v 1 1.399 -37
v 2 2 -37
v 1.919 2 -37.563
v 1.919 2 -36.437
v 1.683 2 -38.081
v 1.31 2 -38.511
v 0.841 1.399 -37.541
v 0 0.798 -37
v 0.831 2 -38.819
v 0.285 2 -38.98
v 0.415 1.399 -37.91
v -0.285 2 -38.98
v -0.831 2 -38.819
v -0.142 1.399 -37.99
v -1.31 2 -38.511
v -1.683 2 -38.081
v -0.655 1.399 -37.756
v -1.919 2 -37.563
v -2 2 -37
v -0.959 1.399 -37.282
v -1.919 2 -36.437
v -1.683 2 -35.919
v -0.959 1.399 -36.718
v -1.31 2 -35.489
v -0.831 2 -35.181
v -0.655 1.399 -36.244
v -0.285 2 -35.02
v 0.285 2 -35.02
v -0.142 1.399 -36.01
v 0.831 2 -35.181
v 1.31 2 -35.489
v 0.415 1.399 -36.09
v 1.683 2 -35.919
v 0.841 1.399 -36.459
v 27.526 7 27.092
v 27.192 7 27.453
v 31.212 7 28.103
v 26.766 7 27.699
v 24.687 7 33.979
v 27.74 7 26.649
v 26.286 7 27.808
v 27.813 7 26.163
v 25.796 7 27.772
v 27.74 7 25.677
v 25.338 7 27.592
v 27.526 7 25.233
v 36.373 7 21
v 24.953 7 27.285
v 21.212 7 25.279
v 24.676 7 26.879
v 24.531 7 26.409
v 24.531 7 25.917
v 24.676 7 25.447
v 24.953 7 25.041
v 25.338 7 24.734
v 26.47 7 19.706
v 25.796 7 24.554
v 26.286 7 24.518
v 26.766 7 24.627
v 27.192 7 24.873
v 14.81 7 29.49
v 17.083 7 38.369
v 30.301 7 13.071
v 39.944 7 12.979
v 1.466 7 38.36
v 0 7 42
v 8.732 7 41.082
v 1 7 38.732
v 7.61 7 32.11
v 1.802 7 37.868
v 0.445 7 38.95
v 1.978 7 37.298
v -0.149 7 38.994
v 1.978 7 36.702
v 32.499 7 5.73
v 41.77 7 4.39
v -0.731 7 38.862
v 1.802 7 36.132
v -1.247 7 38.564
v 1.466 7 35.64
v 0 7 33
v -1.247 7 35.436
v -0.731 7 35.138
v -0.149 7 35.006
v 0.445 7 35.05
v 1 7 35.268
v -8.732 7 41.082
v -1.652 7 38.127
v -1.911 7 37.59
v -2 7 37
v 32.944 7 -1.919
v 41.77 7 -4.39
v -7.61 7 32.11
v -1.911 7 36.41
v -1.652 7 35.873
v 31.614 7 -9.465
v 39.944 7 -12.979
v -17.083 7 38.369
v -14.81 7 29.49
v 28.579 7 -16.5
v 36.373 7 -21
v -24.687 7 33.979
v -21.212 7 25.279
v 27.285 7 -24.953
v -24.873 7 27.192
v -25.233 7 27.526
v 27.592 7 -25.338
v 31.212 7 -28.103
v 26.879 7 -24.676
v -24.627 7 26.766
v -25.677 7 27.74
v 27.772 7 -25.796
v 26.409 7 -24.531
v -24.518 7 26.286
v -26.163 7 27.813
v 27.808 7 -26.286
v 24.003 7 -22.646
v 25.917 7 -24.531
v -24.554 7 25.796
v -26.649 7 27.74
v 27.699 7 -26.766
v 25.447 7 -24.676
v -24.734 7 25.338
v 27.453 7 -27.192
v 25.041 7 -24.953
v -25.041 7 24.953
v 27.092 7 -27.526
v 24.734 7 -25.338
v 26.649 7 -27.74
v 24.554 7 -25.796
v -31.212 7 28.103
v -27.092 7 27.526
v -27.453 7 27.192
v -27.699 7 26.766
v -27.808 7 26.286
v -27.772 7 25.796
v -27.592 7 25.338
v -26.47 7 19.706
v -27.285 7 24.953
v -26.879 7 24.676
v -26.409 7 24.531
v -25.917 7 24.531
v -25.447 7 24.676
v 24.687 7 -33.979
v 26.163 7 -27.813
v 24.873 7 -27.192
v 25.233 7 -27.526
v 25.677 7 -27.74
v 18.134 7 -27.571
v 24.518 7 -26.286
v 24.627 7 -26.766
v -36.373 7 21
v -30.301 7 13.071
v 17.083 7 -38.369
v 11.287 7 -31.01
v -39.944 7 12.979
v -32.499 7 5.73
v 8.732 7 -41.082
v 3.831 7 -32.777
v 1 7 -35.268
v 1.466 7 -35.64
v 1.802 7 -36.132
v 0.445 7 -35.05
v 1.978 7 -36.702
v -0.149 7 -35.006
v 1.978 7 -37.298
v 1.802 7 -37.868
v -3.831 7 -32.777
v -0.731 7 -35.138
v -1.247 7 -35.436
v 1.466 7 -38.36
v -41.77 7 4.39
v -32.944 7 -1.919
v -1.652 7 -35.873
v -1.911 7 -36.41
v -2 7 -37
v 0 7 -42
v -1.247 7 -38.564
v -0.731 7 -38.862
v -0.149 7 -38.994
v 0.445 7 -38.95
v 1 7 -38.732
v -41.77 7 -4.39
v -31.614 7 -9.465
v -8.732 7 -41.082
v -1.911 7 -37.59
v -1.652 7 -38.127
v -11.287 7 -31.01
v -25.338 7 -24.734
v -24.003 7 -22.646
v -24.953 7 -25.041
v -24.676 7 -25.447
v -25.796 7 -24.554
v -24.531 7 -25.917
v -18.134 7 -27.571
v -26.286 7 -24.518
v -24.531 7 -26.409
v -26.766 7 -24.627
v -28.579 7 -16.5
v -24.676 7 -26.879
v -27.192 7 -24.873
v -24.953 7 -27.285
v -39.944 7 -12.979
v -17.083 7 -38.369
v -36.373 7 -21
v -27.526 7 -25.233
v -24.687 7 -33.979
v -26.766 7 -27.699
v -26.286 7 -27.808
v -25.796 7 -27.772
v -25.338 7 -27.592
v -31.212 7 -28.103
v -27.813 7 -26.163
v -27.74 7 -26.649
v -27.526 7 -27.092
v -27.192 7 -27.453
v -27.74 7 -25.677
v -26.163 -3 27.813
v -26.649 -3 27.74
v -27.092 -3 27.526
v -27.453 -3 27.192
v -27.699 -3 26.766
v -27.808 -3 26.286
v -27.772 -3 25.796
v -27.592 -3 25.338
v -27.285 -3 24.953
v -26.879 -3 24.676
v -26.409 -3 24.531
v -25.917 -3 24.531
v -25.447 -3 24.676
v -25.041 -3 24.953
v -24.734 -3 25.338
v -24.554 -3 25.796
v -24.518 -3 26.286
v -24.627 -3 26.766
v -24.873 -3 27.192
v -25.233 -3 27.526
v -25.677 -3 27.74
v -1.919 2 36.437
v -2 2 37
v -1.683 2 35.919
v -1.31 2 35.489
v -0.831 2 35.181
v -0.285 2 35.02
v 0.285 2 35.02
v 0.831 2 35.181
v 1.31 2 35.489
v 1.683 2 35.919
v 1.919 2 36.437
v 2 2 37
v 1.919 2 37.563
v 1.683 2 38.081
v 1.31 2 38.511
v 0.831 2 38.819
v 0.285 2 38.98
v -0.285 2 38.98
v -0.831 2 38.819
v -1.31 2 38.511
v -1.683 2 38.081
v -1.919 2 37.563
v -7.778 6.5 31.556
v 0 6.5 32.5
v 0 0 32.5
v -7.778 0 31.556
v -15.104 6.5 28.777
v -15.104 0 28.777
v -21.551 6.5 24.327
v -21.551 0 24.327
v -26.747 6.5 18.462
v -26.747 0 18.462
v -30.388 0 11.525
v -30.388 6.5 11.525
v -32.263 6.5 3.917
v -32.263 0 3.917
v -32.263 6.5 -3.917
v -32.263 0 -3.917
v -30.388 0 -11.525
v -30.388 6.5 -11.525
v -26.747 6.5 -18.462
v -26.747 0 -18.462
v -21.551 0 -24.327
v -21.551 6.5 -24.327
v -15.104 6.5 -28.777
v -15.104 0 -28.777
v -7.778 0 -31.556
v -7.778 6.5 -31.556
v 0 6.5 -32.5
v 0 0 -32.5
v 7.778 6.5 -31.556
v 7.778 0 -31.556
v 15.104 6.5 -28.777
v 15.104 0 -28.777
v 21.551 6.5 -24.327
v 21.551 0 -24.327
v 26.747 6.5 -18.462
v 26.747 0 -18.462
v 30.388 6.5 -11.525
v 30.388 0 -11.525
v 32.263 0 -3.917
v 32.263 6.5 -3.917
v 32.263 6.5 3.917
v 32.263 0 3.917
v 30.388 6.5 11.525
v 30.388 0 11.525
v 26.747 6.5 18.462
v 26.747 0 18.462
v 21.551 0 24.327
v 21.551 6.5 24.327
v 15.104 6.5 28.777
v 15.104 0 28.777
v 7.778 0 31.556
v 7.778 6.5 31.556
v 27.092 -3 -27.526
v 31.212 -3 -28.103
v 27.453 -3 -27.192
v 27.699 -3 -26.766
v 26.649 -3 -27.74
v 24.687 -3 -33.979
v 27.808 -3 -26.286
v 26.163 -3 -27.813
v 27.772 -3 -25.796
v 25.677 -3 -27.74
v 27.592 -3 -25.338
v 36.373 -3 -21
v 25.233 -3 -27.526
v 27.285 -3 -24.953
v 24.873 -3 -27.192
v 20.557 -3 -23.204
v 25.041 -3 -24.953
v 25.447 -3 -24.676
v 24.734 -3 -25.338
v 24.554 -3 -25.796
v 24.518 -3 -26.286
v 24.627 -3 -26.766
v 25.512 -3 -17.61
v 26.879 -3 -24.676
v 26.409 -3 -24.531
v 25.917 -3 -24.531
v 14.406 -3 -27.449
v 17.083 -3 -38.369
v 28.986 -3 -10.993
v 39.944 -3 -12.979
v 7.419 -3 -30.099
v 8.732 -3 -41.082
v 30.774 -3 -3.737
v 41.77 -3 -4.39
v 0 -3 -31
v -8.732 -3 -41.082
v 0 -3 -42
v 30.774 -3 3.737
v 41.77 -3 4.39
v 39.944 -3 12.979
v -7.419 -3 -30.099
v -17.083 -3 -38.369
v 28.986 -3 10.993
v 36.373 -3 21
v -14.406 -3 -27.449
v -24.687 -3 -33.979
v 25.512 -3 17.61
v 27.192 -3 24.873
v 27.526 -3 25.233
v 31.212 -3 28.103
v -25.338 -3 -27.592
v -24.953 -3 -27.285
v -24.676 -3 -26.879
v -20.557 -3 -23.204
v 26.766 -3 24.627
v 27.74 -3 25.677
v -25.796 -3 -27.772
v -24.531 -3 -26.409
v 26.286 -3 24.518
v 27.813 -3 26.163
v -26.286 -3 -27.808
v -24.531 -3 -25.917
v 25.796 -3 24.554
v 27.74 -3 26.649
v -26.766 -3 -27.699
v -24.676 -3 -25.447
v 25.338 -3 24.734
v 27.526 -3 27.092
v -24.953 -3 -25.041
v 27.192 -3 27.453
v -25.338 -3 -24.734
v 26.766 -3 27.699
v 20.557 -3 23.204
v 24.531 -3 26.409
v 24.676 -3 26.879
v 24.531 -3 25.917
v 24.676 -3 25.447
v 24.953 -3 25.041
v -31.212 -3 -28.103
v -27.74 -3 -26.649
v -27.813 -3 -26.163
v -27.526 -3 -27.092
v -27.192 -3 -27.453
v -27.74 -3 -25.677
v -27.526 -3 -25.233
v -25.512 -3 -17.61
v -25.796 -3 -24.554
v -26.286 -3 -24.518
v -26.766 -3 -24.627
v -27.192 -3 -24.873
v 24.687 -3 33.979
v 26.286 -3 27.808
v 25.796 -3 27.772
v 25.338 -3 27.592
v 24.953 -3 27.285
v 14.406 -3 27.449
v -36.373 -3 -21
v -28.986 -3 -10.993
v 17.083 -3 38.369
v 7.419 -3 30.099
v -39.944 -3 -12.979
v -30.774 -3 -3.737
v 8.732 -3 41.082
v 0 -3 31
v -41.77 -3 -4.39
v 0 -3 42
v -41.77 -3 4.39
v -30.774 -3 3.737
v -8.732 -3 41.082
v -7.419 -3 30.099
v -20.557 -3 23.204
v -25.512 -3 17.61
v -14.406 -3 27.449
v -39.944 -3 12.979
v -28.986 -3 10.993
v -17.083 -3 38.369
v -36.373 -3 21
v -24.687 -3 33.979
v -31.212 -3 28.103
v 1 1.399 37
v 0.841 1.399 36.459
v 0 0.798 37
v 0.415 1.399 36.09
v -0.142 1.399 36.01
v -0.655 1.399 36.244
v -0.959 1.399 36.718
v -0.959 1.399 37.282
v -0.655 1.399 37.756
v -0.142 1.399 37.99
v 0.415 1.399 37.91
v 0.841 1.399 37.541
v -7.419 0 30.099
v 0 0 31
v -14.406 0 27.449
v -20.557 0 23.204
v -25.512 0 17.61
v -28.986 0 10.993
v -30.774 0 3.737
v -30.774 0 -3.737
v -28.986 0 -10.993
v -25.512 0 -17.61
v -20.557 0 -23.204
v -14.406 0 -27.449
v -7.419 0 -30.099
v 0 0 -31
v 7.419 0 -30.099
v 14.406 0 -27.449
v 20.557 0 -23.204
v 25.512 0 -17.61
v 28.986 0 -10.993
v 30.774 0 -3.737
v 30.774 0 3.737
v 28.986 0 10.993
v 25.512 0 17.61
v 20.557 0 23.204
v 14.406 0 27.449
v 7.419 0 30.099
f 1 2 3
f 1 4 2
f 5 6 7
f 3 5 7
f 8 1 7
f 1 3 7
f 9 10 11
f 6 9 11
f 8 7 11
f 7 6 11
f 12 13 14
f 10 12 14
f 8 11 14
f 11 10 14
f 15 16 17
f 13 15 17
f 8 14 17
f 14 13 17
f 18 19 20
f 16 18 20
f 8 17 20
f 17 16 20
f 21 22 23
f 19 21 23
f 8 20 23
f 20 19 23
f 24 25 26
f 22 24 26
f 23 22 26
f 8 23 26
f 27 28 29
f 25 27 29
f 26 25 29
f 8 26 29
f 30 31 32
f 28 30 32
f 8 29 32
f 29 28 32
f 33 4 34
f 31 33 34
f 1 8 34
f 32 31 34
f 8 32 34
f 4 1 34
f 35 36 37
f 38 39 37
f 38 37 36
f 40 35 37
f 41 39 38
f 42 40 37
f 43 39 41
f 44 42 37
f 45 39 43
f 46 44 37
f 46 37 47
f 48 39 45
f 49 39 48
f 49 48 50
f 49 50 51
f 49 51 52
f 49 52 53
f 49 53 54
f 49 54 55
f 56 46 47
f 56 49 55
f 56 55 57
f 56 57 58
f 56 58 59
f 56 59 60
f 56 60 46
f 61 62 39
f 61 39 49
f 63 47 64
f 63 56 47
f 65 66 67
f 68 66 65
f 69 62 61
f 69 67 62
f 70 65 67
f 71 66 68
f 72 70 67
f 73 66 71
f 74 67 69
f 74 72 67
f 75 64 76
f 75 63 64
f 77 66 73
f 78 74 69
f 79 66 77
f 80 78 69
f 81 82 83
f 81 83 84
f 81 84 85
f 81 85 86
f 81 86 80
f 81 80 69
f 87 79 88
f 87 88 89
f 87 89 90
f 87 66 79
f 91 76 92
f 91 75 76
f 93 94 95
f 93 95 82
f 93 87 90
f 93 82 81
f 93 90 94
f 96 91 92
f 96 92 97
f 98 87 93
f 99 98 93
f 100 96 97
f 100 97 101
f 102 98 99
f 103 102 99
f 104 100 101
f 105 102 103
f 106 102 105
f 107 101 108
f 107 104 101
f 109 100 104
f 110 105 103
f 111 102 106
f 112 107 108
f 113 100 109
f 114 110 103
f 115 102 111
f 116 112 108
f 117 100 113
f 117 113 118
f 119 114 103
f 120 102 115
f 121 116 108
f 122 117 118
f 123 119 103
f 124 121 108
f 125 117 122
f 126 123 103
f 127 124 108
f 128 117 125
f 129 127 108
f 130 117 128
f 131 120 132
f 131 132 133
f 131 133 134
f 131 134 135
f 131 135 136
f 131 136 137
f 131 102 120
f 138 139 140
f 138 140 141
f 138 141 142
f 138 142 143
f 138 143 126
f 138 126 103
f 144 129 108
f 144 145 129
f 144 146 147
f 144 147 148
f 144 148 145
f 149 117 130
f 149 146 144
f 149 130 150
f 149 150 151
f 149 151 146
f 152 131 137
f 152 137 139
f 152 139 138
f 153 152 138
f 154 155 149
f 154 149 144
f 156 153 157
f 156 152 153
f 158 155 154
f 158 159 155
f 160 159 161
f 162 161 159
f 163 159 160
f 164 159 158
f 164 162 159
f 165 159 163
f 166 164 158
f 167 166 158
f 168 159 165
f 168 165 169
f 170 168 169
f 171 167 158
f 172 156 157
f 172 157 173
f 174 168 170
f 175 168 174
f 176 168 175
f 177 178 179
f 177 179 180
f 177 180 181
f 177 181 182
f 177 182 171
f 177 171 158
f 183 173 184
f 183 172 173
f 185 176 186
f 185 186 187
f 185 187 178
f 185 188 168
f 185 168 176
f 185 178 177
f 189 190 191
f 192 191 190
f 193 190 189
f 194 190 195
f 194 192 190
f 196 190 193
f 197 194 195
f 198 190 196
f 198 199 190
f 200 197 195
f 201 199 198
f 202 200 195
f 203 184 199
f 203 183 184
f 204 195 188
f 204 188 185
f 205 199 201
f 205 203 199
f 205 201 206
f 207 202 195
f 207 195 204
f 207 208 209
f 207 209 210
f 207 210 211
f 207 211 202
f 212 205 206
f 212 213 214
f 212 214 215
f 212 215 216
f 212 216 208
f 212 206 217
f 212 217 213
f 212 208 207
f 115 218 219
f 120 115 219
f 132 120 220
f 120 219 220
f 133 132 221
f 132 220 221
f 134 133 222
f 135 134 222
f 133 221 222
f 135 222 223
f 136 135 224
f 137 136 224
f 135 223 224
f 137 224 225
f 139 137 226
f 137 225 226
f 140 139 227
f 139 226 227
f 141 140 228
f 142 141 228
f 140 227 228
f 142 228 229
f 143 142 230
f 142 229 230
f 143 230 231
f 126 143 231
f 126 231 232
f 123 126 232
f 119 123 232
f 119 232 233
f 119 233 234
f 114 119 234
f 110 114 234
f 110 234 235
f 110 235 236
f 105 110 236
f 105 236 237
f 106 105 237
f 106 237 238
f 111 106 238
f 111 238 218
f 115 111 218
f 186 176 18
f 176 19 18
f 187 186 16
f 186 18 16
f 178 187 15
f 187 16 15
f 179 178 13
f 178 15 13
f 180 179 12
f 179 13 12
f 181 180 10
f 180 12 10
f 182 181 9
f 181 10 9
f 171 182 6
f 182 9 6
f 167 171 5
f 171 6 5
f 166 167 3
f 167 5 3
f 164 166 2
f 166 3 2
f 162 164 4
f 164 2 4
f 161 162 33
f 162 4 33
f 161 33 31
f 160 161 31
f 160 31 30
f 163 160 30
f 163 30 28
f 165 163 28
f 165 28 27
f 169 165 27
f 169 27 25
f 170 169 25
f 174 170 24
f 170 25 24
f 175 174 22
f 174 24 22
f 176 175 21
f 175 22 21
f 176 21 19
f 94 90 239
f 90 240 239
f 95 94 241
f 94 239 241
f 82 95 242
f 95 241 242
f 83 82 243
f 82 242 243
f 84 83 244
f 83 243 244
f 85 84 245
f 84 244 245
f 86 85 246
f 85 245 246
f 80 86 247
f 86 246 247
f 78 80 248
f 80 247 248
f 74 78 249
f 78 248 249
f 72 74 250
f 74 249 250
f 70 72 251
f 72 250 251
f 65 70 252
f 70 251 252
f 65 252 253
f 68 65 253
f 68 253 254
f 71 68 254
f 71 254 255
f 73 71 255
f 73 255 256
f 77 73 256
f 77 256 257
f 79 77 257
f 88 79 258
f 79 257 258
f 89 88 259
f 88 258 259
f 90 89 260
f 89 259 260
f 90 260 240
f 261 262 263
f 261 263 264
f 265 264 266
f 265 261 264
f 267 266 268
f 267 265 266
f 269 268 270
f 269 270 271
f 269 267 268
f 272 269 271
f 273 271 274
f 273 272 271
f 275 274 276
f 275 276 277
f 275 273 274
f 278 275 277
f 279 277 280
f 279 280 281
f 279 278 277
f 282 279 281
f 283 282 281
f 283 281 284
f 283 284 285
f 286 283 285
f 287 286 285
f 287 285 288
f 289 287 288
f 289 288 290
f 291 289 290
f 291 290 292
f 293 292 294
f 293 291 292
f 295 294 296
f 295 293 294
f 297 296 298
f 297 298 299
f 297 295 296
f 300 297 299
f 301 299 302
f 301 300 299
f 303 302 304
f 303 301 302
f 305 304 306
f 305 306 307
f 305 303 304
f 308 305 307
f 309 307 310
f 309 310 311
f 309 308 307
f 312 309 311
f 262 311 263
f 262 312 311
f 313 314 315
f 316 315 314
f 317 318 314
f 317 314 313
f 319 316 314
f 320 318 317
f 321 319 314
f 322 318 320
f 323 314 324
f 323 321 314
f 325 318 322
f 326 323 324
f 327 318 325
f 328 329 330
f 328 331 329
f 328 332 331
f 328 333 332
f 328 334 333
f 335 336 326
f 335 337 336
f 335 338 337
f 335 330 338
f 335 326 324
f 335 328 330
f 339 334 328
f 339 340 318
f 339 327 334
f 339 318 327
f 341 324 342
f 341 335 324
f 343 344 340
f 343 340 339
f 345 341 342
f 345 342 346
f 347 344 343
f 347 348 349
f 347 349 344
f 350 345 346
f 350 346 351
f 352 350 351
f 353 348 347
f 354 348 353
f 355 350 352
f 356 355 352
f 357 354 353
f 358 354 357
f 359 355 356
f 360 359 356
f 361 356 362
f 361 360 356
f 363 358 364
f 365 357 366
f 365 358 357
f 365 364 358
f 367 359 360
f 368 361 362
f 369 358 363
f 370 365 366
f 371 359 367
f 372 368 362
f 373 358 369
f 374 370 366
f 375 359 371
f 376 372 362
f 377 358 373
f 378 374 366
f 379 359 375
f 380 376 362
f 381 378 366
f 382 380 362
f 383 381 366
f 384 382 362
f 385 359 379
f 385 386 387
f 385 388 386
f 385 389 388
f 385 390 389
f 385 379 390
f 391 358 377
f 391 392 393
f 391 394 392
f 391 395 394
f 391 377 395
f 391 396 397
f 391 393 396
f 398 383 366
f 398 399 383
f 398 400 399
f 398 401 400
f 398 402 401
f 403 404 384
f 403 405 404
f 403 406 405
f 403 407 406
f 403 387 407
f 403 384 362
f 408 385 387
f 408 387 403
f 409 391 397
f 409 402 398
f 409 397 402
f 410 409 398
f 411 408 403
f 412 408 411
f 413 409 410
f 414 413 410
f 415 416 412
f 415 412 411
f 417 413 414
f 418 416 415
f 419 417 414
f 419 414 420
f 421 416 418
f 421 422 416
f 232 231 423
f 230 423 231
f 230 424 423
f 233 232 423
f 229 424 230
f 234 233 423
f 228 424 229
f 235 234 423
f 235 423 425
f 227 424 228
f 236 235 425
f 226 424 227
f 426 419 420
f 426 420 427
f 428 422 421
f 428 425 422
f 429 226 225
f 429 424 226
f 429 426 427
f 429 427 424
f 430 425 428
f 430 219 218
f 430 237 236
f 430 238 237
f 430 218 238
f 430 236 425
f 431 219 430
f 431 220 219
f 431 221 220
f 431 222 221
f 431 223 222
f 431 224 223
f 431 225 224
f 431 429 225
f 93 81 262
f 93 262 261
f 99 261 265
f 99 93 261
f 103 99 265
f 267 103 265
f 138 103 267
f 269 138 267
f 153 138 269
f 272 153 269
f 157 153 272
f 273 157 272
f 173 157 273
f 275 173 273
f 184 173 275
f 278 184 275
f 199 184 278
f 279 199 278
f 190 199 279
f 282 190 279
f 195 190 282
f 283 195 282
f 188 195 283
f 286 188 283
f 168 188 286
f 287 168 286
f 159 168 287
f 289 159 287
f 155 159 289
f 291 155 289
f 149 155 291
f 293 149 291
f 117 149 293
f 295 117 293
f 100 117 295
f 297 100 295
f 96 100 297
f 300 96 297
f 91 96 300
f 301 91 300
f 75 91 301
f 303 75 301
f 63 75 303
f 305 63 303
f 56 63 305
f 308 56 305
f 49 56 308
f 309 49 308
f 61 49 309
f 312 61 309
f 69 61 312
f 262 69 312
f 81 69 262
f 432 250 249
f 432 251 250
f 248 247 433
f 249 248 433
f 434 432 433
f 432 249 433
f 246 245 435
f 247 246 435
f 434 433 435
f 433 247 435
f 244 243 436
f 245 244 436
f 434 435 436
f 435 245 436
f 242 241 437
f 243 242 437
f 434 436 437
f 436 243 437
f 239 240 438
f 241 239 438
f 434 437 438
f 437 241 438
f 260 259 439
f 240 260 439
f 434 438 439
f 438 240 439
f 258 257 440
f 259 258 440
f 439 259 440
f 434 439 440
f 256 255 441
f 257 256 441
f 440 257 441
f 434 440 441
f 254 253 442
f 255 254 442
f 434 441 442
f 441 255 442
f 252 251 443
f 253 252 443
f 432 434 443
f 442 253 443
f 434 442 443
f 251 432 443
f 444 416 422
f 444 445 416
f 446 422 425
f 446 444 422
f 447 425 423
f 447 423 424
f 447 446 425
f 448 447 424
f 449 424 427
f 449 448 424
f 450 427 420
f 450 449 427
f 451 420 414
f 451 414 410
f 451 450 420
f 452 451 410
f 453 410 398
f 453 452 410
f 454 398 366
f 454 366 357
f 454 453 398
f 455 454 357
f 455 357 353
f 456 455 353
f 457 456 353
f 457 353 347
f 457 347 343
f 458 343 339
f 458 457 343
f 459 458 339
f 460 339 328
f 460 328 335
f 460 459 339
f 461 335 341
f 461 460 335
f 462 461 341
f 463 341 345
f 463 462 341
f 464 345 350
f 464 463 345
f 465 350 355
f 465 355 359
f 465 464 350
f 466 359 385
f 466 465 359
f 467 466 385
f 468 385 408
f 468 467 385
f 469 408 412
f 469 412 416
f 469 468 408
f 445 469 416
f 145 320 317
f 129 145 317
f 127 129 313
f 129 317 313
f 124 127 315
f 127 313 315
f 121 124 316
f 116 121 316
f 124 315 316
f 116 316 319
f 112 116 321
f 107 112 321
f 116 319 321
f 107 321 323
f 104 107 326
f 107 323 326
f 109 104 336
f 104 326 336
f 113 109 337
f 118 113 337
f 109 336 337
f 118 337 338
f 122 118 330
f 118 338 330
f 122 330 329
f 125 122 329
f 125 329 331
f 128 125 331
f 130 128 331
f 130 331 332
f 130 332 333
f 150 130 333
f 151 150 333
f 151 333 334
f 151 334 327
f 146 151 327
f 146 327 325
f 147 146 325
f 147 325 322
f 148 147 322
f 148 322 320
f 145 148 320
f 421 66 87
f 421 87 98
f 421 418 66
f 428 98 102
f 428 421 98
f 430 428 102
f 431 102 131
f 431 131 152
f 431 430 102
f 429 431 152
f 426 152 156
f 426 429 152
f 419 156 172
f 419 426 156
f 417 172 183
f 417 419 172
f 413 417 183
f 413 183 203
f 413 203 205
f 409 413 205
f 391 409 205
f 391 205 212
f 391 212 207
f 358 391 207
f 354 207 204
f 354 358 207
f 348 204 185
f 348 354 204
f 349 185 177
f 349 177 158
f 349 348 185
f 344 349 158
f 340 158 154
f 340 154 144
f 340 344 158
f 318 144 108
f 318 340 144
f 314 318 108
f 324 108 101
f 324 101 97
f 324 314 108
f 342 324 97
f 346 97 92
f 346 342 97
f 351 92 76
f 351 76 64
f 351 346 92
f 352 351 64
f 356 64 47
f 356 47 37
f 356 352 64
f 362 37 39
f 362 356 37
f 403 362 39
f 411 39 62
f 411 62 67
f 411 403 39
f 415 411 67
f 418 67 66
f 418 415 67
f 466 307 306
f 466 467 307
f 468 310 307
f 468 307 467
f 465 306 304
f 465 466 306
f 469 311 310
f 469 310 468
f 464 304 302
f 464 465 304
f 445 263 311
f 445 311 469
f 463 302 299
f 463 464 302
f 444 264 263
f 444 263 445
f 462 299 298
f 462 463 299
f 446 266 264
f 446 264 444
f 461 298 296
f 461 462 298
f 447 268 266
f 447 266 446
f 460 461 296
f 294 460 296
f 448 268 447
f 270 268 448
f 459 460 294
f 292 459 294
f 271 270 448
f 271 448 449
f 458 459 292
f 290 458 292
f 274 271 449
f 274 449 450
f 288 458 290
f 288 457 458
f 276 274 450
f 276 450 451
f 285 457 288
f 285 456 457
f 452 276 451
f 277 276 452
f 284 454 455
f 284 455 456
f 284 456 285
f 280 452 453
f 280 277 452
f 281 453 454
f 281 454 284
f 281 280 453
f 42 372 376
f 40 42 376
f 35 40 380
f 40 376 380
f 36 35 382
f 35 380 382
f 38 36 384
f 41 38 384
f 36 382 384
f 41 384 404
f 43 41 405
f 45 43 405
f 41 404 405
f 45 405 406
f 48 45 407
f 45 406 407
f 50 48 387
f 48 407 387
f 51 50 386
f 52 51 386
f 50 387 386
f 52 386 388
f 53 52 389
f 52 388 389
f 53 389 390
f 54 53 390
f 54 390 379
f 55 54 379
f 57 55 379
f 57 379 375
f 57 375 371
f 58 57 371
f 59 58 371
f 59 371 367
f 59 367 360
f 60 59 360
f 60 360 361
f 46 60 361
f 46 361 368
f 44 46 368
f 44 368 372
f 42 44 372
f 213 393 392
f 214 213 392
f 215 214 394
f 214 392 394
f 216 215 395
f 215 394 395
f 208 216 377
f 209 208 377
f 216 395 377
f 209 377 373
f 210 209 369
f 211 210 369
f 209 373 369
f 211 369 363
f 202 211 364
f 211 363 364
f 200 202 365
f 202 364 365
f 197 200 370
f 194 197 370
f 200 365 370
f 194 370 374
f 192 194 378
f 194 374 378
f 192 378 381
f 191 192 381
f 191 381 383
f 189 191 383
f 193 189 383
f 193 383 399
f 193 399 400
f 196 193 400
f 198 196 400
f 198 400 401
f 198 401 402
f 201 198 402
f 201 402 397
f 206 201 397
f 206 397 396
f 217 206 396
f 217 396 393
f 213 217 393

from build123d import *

# Parameters (mm, degrees)
DIAM_TRE_DU_PER_AGE_4_0_4_1_D     = 4
DIAM_TRE_DU_PER_AGE_4_0_4_1_DEPTH = 5
DIAM_TRE_DU_PER_AGE_4_0_4_1_TIP   = 1.201721238
TROU_TARAUD_M41_D                 = 3.3
R_P_TITION_CIRCULAIRE1_COUNT      = 4
CHANFREIN1_SIZE                   = 0.5


with BuildPart() as part:
    # Esquisse1 → Révolution1 (revolve)
    with BuildSketch(Plane(origin=(0, 0, 0), x_dir=(0, 0, -1), z_dir=(1, 0, 0))):
        Polygon((-31, -3), (-31, 0), (-32.5, 0), (-32.5, 7), (-42, 7), (-42, -3), align=None)
    revolve(axis=Axis((0, 0, 0), (0, -1, 0)))

    # Diamètre du perçage Ø4.0 (4)1
    with Locations(Plane(origin=(0, 7, 0), x_dir=(1, 0, 0), z_dir=(0, 1, 0))):
        with Locations((0, 37), (0, -37)):
            Hole(DIAM_TRE_DU_PER_AGE_4_0_4_1_D / 2, depth=DIAM_TRE_DU_PER_AGE_4_0_4_1_DEPTH)
            with Locations((0, 0, -(DIAM_TRE_DU_PER_AGE_4_0_4_1_DEPTH + DIAM_TRE_DU_PER_AGE_4_0_4_1_TIP / 2))):  # 118° drill point
                Cone(0, DIAM_TRE_DU_PER_AGE_4_0_4_1_D / 2, DIAM_TRE_DU_PER_AGE_4_0_4_1_TIP, mode=Mode.SUBTRACT)

    # Trou taraudé M41 (through all)
    with Locations(Plane(origin=(0, 7, 0), x_dir=(1, 0, 0), z_dir=(0, 1, 0))):
        with Locations((-26.162950904, 26.162950904)):
            trou_taraud_m41 = Hole(TROU_TARAUD_M41_D / 2)

    # Répétition circulaire1: Trou taraudé M41 ×4 about axis
    r_p_tition_circulaire1_axis = Axis((0, 0, 0), (0, 1, 0))
    for i in range(1, R_P_TITION_CIRCULAIRE1_COUNT):
        add(trou_taraud_m41.rotate(r_p_tition_circulaire1_axis, i * 360 / R_P_TITION_CIRCULAIRE1_COUNT), mode=Mode.SUBTRACT)

    # Chanfrein1
    chanfrein1_edges = [part.edges().sort_by_distance(p)[0] for p in [
        (0, 7, -32.5),
    ]]
    chamfer(chanfrein1_edges, length=CHANFREIN1_SIZE)


solid = part.part
